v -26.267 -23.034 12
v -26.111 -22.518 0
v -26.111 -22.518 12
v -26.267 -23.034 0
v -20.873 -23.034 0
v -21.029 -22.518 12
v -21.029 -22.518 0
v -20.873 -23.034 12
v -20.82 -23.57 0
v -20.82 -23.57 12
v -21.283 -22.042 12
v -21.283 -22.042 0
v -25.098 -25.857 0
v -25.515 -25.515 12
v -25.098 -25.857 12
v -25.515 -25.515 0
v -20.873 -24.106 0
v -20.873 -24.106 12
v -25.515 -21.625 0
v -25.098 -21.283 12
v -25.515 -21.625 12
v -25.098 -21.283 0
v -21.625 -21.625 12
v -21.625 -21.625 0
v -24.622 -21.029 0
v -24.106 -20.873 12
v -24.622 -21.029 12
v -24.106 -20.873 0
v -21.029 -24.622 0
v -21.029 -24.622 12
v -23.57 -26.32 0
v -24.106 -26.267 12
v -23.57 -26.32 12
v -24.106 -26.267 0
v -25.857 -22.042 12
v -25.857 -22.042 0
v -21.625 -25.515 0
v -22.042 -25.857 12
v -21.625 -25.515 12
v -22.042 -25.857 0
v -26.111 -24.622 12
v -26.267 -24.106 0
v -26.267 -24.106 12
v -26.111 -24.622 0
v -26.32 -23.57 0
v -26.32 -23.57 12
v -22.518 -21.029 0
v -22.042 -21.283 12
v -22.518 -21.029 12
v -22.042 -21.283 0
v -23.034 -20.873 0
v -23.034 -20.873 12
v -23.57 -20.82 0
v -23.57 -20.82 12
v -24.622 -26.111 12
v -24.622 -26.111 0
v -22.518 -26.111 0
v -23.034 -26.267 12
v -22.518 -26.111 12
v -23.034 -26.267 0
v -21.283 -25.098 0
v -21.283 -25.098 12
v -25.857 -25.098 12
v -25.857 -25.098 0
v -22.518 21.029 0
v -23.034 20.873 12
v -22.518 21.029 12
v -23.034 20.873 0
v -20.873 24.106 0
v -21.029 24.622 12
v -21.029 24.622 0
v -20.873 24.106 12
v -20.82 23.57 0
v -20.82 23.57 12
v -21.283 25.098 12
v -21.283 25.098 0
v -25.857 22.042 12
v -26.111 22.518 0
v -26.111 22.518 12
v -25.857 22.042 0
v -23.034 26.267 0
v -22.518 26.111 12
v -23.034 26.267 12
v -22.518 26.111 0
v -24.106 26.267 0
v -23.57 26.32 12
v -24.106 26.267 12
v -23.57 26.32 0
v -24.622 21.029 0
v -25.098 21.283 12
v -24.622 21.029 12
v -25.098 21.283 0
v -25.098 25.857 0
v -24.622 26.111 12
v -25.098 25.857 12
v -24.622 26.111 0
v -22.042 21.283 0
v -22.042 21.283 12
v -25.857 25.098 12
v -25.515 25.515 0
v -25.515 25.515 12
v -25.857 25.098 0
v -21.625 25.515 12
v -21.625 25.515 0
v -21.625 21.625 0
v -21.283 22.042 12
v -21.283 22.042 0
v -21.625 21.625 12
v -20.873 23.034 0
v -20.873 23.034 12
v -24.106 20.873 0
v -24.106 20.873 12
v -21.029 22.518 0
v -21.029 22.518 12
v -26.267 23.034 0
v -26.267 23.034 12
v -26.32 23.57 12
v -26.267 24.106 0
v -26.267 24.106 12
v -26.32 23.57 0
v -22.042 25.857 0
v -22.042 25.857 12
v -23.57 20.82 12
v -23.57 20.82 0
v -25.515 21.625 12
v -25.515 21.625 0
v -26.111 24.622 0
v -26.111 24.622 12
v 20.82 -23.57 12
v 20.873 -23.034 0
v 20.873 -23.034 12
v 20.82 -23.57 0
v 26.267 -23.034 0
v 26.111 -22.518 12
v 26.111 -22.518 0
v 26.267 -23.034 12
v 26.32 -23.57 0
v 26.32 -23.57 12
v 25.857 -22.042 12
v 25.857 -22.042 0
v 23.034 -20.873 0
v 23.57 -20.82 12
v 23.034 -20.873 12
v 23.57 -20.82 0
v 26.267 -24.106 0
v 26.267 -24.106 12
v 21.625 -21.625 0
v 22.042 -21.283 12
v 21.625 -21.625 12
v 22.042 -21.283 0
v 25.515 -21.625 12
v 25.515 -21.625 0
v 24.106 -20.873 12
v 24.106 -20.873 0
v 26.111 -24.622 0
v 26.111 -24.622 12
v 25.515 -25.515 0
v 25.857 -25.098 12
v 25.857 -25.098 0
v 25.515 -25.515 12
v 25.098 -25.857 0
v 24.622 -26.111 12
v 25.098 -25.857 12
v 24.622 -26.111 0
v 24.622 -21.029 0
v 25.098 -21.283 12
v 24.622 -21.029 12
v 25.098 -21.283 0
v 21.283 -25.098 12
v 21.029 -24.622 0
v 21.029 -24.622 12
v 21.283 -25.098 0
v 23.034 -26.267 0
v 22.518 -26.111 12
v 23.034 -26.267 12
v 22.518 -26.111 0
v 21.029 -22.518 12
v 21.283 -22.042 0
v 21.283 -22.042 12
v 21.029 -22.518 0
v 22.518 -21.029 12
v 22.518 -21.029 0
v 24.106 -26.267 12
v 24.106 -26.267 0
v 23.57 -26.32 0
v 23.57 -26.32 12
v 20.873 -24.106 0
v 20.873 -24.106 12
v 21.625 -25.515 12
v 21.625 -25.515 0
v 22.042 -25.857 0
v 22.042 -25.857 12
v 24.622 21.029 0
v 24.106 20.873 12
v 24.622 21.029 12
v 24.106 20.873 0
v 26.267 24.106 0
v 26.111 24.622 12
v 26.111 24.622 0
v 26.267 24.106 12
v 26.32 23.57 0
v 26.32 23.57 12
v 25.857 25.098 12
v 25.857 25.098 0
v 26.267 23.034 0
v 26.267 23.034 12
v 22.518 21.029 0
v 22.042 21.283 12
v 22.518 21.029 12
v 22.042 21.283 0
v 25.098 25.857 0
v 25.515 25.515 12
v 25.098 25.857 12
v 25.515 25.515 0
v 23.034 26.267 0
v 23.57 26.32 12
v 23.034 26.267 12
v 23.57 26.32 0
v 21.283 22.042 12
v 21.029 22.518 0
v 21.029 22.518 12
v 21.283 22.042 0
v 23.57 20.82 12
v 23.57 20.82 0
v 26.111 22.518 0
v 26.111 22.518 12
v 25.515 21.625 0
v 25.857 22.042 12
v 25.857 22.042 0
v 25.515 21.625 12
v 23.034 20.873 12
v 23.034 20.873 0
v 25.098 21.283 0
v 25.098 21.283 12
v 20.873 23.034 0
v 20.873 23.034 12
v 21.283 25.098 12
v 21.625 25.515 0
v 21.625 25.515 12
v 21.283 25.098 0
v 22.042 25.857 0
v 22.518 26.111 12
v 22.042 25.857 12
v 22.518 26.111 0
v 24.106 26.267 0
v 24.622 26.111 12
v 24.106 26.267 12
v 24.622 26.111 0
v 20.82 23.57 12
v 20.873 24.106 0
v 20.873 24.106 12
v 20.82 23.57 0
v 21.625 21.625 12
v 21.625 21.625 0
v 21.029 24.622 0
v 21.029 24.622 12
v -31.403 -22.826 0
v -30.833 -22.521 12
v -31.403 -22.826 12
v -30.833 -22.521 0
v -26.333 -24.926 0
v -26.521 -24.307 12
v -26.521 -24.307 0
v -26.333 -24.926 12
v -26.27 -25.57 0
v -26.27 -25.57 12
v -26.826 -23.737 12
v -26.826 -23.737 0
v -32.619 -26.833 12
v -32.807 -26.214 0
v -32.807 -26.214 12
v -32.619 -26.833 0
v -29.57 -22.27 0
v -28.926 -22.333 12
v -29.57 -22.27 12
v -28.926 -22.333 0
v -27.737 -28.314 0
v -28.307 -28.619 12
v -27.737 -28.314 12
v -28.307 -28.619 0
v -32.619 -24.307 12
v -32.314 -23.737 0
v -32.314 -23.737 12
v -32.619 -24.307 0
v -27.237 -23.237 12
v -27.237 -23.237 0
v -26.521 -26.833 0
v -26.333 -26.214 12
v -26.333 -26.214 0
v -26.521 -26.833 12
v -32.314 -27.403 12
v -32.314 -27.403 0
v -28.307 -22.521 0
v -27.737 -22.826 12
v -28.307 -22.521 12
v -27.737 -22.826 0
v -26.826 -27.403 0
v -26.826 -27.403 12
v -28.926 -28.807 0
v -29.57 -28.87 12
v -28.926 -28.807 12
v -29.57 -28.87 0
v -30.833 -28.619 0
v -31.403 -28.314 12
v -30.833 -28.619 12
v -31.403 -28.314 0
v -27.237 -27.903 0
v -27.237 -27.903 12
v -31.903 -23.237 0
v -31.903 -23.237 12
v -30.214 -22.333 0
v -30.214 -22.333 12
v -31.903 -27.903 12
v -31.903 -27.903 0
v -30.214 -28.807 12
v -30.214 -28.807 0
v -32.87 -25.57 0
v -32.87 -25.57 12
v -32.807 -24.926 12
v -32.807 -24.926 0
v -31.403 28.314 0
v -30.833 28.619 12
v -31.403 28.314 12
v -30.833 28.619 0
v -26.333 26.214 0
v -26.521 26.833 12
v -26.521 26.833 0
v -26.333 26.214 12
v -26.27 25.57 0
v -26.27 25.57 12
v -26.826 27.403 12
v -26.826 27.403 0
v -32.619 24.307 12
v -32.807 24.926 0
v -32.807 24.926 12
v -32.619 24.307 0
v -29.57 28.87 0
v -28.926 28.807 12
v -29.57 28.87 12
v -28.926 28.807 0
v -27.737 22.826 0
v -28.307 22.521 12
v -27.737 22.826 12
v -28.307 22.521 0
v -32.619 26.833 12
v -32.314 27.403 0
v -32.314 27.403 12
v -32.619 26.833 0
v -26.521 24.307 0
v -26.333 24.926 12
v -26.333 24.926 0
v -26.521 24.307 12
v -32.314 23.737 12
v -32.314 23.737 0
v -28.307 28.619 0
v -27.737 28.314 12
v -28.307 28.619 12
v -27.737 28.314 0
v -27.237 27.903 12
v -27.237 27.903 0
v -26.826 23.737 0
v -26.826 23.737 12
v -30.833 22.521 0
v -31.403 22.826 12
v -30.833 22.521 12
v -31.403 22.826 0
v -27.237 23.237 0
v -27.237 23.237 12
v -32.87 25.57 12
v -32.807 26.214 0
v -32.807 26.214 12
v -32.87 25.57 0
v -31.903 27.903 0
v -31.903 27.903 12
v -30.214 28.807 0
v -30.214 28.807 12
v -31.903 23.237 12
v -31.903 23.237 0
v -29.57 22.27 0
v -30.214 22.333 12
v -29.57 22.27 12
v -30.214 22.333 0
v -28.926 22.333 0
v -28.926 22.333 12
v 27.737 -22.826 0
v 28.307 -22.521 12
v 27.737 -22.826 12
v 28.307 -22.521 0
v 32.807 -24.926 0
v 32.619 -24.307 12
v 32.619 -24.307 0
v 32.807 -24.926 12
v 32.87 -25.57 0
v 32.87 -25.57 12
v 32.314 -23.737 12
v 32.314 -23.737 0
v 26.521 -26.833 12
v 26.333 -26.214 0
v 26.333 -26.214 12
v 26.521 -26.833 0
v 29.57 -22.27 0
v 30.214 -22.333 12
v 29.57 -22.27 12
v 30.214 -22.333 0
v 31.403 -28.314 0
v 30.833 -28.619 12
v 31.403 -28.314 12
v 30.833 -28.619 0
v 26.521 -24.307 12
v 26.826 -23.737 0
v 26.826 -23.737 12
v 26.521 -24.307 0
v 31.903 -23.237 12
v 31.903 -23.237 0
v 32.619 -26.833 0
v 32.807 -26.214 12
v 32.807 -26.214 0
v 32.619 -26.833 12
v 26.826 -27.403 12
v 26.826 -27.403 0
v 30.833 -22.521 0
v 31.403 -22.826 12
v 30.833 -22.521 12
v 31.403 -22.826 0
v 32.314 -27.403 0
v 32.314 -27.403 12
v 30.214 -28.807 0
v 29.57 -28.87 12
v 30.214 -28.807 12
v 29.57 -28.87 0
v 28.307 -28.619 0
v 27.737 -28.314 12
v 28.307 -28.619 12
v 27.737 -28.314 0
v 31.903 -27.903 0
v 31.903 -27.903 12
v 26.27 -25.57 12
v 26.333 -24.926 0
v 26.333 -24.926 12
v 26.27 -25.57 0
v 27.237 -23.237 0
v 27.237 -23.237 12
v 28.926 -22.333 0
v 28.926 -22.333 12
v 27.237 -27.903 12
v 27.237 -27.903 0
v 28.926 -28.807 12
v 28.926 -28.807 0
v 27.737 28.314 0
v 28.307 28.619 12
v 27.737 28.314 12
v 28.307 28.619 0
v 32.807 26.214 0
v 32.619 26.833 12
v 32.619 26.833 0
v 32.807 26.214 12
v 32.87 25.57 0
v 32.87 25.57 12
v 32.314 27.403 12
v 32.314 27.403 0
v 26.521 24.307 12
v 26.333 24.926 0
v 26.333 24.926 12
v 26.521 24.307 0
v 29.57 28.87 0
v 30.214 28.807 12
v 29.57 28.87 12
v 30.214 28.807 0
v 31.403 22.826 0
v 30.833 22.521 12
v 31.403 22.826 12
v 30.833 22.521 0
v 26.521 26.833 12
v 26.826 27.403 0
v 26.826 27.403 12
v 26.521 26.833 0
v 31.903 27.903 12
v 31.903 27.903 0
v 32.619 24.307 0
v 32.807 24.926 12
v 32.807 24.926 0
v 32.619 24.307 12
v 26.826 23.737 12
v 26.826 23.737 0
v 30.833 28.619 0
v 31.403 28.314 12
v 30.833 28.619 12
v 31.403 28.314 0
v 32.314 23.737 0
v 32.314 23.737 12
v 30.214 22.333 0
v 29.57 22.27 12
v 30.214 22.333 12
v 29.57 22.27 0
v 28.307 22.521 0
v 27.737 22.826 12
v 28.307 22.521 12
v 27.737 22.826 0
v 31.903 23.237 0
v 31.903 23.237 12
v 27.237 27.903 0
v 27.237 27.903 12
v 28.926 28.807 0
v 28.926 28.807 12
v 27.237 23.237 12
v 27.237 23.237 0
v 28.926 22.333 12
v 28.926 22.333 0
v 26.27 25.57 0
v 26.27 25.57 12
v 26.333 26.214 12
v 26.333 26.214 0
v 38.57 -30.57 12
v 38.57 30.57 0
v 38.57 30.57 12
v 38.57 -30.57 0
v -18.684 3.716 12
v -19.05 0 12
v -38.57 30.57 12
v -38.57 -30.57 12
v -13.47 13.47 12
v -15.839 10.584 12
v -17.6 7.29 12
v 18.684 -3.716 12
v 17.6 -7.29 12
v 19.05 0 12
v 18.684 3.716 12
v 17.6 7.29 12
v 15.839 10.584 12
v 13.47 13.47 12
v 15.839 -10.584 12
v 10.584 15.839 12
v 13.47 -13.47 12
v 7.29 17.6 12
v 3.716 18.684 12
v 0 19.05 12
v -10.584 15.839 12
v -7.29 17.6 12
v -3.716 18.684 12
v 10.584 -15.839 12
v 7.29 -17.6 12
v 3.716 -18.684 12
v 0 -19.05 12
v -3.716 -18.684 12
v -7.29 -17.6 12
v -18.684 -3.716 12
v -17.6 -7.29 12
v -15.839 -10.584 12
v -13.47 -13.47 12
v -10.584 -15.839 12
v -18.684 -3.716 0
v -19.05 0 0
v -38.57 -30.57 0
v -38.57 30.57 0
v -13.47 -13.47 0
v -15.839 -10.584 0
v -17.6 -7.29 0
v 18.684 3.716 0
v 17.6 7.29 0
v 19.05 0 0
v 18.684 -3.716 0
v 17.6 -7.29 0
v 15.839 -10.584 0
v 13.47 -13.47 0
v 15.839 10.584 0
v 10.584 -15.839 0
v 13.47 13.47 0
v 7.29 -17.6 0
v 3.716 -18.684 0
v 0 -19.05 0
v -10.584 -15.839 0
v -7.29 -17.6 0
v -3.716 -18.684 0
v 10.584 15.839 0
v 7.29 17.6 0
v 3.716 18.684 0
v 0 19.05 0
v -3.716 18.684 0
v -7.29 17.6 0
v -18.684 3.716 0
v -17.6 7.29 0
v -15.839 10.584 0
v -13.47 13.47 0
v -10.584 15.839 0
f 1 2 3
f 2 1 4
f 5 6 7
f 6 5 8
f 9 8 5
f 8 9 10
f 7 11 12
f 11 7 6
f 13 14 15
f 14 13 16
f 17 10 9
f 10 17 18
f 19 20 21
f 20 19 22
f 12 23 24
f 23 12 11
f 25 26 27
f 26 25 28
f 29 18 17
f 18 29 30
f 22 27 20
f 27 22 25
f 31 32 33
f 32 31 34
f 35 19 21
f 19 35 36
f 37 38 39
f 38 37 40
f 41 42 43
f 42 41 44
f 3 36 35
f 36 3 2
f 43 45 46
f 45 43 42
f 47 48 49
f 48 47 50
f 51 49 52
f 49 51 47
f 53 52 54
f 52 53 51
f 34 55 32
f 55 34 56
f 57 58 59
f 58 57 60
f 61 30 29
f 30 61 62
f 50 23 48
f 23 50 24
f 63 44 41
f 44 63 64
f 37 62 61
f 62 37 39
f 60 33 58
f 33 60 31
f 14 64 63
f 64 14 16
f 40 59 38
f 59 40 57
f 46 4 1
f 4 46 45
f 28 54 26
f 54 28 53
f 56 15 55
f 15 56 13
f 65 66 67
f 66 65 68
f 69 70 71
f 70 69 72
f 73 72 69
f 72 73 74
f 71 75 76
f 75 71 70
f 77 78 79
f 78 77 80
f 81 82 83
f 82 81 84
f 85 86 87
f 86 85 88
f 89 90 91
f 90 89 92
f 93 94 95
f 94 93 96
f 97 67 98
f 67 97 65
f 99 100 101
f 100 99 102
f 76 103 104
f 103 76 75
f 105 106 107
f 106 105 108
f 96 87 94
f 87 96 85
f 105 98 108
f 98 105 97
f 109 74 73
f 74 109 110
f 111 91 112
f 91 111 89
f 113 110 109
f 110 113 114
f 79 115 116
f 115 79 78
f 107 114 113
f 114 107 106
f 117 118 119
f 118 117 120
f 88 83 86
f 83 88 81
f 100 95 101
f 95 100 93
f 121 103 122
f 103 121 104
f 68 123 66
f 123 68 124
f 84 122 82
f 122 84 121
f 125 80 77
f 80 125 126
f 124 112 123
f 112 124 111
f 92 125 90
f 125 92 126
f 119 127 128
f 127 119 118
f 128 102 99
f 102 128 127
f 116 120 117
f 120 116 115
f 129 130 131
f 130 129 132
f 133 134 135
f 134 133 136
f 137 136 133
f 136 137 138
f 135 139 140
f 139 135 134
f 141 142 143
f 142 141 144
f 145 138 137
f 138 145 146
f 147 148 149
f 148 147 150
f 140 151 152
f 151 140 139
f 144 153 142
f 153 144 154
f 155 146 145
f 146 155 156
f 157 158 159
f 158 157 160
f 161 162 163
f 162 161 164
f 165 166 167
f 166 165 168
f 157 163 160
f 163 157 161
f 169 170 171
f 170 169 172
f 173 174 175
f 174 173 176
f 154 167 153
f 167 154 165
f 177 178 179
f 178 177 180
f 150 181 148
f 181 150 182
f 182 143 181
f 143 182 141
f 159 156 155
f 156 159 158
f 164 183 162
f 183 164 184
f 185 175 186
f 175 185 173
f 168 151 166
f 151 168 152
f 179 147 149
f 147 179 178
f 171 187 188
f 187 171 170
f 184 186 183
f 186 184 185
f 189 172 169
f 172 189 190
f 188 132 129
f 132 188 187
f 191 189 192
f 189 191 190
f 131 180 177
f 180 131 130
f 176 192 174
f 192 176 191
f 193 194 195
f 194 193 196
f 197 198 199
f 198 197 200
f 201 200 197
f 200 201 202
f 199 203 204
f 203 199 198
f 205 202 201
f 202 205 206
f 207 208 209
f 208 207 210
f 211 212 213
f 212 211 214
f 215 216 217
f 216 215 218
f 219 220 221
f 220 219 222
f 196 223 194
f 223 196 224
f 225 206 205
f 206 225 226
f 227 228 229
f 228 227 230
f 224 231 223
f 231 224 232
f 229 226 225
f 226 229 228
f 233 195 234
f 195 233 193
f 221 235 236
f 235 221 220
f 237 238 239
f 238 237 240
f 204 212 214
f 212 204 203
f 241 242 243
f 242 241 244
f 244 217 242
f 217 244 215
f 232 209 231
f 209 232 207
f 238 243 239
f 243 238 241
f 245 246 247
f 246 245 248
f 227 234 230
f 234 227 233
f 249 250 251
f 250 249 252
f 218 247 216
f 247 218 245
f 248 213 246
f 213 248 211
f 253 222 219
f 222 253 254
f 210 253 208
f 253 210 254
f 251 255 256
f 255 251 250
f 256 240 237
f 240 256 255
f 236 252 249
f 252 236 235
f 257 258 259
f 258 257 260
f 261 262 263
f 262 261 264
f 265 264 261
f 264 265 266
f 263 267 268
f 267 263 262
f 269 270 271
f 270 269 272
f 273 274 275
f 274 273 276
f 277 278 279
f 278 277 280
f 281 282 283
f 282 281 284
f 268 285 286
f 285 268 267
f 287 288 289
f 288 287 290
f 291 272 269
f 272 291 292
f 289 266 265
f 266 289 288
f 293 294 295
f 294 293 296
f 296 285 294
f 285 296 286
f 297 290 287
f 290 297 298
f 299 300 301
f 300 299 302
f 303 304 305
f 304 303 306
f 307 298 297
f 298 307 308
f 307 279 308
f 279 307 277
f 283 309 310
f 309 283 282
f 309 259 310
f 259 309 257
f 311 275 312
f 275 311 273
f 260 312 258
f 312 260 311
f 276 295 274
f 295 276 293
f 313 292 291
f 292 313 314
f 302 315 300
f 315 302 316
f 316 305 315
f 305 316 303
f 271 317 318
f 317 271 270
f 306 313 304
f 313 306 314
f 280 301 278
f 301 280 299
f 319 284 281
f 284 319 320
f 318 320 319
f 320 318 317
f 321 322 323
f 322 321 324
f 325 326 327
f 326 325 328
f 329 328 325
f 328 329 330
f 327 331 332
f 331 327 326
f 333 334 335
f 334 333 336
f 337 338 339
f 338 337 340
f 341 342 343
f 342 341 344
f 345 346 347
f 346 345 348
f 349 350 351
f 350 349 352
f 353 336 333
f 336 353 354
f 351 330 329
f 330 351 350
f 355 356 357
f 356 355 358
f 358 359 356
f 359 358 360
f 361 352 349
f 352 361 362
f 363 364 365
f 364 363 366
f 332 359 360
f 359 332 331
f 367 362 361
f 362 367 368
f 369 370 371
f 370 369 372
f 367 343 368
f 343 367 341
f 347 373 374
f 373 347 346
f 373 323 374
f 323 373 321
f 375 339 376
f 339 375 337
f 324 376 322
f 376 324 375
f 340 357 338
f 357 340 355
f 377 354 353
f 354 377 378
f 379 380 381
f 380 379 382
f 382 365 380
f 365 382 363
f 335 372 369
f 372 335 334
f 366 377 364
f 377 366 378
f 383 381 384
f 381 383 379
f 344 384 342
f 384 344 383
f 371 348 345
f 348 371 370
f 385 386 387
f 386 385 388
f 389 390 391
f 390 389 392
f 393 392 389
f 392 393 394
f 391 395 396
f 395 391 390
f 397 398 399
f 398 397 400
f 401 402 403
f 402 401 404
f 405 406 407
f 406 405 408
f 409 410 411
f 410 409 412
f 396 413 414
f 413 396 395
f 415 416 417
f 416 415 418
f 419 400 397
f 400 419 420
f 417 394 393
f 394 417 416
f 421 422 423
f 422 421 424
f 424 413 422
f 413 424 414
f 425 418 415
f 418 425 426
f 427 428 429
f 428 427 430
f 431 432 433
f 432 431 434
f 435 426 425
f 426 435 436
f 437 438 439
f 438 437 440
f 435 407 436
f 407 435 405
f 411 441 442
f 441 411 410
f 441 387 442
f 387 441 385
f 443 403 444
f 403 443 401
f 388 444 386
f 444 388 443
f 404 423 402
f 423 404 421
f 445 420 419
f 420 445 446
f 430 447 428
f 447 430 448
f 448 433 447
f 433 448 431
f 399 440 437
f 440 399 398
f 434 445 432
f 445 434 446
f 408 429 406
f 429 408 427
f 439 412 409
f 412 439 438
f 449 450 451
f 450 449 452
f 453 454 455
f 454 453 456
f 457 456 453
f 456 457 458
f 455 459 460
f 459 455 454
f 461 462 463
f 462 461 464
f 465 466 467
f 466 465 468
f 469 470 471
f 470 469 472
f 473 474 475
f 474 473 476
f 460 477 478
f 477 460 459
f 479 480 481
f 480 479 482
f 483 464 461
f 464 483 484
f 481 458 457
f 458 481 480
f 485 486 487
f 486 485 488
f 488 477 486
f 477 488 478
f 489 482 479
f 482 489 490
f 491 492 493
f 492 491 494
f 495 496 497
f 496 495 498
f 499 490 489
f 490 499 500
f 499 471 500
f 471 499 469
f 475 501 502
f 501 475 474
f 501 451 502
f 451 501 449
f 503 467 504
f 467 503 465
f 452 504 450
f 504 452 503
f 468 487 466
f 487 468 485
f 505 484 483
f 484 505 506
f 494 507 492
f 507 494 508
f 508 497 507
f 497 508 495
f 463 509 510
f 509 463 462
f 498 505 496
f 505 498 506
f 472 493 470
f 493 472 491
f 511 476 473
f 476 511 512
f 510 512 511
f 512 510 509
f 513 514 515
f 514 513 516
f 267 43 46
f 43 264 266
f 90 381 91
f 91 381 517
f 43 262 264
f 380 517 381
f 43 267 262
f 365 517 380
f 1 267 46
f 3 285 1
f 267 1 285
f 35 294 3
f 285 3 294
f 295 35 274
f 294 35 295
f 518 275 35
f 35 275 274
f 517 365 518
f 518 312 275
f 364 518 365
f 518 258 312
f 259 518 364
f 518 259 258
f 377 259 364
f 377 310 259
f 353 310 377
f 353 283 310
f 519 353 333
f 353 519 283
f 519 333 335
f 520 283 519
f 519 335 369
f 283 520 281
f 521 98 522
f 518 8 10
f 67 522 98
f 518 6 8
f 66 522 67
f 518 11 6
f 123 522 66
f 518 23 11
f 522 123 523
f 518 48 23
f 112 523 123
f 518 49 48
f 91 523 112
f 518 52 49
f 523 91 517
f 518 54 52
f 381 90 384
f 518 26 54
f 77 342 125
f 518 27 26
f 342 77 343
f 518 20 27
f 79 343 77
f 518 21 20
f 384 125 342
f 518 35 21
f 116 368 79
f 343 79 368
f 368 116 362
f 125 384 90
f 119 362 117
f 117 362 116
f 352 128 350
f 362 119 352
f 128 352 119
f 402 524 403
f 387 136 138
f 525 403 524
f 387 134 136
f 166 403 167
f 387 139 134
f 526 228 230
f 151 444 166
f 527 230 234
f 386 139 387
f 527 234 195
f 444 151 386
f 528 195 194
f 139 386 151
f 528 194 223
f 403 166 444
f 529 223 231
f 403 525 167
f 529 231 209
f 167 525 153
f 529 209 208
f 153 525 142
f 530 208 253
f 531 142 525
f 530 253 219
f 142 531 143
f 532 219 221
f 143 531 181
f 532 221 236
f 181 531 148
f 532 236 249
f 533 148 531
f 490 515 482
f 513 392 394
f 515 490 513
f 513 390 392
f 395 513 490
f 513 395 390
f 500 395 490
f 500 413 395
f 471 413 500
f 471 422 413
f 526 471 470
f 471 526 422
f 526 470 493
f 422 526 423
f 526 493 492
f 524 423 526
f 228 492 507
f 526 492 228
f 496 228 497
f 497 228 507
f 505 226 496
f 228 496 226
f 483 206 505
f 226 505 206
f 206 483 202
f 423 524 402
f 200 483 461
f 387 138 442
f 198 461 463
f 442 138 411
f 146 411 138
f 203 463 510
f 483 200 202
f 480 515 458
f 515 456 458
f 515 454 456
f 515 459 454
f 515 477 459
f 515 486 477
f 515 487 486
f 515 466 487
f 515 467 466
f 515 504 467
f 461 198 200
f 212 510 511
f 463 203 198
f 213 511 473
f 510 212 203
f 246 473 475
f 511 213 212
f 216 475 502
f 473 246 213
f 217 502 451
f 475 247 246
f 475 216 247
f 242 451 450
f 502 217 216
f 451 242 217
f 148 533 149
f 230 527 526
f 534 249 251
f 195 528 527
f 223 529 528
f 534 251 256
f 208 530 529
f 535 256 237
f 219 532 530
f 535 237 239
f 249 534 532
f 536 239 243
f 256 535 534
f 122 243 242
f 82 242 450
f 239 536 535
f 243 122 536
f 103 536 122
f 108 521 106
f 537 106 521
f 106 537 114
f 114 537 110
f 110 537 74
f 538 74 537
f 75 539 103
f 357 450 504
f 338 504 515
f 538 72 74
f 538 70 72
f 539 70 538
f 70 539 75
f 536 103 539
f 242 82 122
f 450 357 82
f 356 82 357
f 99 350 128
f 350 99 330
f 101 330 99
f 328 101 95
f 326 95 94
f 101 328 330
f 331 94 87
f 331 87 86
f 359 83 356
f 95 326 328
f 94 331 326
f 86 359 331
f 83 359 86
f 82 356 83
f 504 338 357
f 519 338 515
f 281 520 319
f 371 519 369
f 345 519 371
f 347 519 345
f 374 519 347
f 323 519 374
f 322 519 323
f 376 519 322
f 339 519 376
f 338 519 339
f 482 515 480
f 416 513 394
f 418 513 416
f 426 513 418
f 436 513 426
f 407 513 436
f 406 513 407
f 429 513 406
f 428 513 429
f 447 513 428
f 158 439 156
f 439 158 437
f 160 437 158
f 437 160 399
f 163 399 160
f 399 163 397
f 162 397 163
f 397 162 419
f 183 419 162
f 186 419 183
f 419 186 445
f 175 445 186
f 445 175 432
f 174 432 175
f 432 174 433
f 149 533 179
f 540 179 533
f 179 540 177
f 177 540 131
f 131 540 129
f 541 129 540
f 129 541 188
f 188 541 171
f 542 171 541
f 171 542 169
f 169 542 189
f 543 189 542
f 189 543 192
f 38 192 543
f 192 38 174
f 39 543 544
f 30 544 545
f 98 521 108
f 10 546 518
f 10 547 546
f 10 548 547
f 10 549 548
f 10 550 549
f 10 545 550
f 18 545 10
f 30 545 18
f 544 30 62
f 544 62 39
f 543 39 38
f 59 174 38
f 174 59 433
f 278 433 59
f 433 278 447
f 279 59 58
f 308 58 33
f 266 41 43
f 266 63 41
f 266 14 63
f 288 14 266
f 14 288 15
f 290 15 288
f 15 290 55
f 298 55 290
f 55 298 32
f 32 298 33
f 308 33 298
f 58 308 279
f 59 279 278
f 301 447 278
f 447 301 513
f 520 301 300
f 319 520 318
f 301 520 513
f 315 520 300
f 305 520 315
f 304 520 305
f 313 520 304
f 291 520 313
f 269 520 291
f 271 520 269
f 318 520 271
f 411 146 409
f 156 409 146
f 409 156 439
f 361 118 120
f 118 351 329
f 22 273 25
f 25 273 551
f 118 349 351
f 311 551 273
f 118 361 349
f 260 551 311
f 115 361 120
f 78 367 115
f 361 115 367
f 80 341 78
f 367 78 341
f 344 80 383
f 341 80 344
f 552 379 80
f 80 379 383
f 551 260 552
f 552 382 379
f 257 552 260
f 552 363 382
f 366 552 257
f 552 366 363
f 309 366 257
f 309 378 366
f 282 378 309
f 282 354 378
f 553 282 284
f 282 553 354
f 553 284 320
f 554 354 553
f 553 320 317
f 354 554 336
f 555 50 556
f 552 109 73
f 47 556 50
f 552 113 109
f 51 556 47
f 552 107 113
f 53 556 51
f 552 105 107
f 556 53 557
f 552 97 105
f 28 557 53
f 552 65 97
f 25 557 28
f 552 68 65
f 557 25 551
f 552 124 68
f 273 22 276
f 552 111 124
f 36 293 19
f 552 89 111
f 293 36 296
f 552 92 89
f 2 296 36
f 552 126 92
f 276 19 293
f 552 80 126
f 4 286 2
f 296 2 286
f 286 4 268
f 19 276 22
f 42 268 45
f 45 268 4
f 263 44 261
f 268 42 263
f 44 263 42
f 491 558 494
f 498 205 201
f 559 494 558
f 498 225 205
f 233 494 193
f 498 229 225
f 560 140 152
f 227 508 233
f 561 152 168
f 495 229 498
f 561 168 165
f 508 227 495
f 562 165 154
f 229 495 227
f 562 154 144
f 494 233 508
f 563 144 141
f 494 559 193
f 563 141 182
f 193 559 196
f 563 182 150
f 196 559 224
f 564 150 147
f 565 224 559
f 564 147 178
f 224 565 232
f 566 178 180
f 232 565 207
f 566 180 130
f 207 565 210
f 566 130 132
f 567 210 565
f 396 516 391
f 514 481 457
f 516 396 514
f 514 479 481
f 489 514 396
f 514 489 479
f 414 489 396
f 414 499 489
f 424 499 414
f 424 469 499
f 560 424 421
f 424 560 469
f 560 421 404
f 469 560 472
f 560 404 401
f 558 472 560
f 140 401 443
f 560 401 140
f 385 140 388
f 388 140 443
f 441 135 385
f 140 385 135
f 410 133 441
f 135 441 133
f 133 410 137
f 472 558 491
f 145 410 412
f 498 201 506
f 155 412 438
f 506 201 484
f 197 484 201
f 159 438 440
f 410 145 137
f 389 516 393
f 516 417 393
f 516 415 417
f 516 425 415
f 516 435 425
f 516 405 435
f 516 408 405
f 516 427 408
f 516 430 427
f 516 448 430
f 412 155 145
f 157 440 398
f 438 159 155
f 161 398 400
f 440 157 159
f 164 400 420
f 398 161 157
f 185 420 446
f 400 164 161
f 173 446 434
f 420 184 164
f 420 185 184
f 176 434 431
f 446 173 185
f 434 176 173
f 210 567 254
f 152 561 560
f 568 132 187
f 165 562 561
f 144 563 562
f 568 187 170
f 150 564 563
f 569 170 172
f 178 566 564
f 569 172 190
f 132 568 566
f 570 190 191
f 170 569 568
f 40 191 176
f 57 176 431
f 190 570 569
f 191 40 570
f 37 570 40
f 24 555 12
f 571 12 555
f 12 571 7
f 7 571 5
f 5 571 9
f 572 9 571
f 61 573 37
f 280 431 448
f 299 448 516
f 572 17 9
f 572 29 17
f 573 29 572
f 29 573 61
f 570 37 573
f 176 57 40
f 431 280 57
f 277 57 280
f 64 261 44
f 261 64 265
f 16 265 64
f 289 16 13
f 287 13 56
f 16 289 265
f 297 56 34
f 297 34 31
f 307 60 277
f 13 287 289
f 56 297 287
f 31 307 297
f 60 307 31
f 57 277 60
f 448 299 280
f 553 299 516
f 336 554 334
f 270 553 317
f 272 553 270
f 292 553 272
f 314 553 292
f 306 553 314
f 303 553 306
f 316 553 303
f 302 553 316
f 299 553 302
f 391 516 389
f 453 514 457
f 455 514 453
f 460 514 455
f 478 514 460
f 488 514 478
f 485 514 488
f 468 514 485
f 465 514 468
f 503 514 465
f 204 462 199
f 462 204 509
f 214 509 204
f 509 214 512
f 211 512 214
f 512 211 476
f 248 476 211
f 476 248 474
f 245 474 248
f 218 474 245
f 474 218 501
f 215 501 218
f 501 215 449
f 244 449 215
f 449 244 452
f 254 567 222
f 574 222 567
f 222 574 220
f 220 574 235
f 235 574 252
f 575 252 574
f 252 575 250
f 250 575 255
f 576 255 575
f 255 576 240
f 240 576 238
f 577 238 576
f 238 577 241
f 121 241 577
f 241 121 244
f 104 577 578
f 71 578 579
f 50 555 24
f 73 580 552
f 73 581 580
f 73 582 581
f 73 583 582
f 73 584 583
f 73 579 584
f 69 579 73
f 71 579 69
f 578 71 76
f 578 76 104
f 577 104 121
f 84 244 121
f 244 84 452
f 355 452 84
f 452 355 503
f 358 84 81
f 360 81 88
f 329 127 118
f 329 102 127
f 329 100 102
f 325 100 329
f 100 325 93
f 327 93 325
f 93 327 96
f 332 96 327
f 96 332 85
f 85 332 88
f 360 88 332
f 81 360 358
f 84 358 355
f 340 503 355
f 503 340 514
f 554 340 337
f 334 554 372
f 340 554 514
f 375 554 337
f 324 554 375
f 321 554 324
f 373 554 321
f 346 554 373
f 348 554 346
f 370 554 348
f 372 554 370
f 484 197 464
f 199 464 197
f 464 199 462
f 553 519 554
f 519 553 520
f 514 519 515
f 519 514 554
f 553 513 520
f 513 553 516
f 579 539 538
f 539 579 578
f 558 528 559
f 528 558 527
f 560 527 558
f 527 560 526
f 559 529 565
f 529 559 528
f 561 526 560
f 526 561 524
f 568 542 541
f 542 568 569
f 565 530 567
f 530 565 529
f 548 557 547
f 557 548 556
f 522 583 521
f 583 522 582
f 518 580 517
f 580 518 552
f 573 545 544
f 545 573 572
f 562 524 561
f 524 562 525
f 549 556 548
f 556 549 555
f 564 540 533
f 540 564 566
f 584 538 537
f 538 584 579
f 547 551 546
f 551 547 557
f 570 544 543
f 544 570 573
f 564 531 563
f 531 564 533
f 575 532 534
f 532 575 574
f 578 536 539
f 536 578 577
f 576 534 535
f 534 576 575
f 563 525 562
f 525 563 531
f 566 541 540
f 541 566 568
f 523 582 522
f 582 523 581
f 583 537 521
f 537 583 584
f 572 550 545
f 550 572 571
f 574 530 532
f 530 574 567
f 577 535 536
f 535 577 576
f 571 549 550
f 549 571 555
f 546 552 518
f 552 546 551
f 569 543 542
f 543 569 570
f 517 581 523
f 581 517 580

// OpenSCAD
$fn = 32;

// ----------------------------------------------------------------------
// Motor mount plate: NEMA23, 77.14 x 61.14 x 12 mm
// ----------------------------------------------------------------------

// --- parameters (mm) ---
plate_w = 77.14;          // plate length, X
plate_d = 61.14;          // plate width, Y
plate_t = 12;             // plate thickness
pattern = 47.14;          // NEMA23 bolt spacing
motor_d = 5.5;            // NEMA23 screw clearance
pilot_d = 38.1;           // pilot boss bore
second_d = 6.6;           // second fastener hole

module plate() {
  translate([-plate_w / 2, -plate_d / 2, 0]) cube([plate_w, plate_d, plate_t]);
}

module motor_holes() {
  for (sx = [-1, 1]) for (sy = [-1, 1])
    translate([sx * pattern / 2, sy * pattern / 2, -1])
      cylinder(h = plate_t + 2, d = motor_d);
}

difference() {
  union() {
    plate();
  }
  motor_holes();
  translate([0, 0, -1]) cylinder(h = plate_t + 2, d = pilot_d);
  for (sx = [-1, 1]) for (sy = [-1, 1])
    translate([sx * 29.57, sy * 25.57, -1]) cylinder(h = plate_t + 2, d = second_d);
}
